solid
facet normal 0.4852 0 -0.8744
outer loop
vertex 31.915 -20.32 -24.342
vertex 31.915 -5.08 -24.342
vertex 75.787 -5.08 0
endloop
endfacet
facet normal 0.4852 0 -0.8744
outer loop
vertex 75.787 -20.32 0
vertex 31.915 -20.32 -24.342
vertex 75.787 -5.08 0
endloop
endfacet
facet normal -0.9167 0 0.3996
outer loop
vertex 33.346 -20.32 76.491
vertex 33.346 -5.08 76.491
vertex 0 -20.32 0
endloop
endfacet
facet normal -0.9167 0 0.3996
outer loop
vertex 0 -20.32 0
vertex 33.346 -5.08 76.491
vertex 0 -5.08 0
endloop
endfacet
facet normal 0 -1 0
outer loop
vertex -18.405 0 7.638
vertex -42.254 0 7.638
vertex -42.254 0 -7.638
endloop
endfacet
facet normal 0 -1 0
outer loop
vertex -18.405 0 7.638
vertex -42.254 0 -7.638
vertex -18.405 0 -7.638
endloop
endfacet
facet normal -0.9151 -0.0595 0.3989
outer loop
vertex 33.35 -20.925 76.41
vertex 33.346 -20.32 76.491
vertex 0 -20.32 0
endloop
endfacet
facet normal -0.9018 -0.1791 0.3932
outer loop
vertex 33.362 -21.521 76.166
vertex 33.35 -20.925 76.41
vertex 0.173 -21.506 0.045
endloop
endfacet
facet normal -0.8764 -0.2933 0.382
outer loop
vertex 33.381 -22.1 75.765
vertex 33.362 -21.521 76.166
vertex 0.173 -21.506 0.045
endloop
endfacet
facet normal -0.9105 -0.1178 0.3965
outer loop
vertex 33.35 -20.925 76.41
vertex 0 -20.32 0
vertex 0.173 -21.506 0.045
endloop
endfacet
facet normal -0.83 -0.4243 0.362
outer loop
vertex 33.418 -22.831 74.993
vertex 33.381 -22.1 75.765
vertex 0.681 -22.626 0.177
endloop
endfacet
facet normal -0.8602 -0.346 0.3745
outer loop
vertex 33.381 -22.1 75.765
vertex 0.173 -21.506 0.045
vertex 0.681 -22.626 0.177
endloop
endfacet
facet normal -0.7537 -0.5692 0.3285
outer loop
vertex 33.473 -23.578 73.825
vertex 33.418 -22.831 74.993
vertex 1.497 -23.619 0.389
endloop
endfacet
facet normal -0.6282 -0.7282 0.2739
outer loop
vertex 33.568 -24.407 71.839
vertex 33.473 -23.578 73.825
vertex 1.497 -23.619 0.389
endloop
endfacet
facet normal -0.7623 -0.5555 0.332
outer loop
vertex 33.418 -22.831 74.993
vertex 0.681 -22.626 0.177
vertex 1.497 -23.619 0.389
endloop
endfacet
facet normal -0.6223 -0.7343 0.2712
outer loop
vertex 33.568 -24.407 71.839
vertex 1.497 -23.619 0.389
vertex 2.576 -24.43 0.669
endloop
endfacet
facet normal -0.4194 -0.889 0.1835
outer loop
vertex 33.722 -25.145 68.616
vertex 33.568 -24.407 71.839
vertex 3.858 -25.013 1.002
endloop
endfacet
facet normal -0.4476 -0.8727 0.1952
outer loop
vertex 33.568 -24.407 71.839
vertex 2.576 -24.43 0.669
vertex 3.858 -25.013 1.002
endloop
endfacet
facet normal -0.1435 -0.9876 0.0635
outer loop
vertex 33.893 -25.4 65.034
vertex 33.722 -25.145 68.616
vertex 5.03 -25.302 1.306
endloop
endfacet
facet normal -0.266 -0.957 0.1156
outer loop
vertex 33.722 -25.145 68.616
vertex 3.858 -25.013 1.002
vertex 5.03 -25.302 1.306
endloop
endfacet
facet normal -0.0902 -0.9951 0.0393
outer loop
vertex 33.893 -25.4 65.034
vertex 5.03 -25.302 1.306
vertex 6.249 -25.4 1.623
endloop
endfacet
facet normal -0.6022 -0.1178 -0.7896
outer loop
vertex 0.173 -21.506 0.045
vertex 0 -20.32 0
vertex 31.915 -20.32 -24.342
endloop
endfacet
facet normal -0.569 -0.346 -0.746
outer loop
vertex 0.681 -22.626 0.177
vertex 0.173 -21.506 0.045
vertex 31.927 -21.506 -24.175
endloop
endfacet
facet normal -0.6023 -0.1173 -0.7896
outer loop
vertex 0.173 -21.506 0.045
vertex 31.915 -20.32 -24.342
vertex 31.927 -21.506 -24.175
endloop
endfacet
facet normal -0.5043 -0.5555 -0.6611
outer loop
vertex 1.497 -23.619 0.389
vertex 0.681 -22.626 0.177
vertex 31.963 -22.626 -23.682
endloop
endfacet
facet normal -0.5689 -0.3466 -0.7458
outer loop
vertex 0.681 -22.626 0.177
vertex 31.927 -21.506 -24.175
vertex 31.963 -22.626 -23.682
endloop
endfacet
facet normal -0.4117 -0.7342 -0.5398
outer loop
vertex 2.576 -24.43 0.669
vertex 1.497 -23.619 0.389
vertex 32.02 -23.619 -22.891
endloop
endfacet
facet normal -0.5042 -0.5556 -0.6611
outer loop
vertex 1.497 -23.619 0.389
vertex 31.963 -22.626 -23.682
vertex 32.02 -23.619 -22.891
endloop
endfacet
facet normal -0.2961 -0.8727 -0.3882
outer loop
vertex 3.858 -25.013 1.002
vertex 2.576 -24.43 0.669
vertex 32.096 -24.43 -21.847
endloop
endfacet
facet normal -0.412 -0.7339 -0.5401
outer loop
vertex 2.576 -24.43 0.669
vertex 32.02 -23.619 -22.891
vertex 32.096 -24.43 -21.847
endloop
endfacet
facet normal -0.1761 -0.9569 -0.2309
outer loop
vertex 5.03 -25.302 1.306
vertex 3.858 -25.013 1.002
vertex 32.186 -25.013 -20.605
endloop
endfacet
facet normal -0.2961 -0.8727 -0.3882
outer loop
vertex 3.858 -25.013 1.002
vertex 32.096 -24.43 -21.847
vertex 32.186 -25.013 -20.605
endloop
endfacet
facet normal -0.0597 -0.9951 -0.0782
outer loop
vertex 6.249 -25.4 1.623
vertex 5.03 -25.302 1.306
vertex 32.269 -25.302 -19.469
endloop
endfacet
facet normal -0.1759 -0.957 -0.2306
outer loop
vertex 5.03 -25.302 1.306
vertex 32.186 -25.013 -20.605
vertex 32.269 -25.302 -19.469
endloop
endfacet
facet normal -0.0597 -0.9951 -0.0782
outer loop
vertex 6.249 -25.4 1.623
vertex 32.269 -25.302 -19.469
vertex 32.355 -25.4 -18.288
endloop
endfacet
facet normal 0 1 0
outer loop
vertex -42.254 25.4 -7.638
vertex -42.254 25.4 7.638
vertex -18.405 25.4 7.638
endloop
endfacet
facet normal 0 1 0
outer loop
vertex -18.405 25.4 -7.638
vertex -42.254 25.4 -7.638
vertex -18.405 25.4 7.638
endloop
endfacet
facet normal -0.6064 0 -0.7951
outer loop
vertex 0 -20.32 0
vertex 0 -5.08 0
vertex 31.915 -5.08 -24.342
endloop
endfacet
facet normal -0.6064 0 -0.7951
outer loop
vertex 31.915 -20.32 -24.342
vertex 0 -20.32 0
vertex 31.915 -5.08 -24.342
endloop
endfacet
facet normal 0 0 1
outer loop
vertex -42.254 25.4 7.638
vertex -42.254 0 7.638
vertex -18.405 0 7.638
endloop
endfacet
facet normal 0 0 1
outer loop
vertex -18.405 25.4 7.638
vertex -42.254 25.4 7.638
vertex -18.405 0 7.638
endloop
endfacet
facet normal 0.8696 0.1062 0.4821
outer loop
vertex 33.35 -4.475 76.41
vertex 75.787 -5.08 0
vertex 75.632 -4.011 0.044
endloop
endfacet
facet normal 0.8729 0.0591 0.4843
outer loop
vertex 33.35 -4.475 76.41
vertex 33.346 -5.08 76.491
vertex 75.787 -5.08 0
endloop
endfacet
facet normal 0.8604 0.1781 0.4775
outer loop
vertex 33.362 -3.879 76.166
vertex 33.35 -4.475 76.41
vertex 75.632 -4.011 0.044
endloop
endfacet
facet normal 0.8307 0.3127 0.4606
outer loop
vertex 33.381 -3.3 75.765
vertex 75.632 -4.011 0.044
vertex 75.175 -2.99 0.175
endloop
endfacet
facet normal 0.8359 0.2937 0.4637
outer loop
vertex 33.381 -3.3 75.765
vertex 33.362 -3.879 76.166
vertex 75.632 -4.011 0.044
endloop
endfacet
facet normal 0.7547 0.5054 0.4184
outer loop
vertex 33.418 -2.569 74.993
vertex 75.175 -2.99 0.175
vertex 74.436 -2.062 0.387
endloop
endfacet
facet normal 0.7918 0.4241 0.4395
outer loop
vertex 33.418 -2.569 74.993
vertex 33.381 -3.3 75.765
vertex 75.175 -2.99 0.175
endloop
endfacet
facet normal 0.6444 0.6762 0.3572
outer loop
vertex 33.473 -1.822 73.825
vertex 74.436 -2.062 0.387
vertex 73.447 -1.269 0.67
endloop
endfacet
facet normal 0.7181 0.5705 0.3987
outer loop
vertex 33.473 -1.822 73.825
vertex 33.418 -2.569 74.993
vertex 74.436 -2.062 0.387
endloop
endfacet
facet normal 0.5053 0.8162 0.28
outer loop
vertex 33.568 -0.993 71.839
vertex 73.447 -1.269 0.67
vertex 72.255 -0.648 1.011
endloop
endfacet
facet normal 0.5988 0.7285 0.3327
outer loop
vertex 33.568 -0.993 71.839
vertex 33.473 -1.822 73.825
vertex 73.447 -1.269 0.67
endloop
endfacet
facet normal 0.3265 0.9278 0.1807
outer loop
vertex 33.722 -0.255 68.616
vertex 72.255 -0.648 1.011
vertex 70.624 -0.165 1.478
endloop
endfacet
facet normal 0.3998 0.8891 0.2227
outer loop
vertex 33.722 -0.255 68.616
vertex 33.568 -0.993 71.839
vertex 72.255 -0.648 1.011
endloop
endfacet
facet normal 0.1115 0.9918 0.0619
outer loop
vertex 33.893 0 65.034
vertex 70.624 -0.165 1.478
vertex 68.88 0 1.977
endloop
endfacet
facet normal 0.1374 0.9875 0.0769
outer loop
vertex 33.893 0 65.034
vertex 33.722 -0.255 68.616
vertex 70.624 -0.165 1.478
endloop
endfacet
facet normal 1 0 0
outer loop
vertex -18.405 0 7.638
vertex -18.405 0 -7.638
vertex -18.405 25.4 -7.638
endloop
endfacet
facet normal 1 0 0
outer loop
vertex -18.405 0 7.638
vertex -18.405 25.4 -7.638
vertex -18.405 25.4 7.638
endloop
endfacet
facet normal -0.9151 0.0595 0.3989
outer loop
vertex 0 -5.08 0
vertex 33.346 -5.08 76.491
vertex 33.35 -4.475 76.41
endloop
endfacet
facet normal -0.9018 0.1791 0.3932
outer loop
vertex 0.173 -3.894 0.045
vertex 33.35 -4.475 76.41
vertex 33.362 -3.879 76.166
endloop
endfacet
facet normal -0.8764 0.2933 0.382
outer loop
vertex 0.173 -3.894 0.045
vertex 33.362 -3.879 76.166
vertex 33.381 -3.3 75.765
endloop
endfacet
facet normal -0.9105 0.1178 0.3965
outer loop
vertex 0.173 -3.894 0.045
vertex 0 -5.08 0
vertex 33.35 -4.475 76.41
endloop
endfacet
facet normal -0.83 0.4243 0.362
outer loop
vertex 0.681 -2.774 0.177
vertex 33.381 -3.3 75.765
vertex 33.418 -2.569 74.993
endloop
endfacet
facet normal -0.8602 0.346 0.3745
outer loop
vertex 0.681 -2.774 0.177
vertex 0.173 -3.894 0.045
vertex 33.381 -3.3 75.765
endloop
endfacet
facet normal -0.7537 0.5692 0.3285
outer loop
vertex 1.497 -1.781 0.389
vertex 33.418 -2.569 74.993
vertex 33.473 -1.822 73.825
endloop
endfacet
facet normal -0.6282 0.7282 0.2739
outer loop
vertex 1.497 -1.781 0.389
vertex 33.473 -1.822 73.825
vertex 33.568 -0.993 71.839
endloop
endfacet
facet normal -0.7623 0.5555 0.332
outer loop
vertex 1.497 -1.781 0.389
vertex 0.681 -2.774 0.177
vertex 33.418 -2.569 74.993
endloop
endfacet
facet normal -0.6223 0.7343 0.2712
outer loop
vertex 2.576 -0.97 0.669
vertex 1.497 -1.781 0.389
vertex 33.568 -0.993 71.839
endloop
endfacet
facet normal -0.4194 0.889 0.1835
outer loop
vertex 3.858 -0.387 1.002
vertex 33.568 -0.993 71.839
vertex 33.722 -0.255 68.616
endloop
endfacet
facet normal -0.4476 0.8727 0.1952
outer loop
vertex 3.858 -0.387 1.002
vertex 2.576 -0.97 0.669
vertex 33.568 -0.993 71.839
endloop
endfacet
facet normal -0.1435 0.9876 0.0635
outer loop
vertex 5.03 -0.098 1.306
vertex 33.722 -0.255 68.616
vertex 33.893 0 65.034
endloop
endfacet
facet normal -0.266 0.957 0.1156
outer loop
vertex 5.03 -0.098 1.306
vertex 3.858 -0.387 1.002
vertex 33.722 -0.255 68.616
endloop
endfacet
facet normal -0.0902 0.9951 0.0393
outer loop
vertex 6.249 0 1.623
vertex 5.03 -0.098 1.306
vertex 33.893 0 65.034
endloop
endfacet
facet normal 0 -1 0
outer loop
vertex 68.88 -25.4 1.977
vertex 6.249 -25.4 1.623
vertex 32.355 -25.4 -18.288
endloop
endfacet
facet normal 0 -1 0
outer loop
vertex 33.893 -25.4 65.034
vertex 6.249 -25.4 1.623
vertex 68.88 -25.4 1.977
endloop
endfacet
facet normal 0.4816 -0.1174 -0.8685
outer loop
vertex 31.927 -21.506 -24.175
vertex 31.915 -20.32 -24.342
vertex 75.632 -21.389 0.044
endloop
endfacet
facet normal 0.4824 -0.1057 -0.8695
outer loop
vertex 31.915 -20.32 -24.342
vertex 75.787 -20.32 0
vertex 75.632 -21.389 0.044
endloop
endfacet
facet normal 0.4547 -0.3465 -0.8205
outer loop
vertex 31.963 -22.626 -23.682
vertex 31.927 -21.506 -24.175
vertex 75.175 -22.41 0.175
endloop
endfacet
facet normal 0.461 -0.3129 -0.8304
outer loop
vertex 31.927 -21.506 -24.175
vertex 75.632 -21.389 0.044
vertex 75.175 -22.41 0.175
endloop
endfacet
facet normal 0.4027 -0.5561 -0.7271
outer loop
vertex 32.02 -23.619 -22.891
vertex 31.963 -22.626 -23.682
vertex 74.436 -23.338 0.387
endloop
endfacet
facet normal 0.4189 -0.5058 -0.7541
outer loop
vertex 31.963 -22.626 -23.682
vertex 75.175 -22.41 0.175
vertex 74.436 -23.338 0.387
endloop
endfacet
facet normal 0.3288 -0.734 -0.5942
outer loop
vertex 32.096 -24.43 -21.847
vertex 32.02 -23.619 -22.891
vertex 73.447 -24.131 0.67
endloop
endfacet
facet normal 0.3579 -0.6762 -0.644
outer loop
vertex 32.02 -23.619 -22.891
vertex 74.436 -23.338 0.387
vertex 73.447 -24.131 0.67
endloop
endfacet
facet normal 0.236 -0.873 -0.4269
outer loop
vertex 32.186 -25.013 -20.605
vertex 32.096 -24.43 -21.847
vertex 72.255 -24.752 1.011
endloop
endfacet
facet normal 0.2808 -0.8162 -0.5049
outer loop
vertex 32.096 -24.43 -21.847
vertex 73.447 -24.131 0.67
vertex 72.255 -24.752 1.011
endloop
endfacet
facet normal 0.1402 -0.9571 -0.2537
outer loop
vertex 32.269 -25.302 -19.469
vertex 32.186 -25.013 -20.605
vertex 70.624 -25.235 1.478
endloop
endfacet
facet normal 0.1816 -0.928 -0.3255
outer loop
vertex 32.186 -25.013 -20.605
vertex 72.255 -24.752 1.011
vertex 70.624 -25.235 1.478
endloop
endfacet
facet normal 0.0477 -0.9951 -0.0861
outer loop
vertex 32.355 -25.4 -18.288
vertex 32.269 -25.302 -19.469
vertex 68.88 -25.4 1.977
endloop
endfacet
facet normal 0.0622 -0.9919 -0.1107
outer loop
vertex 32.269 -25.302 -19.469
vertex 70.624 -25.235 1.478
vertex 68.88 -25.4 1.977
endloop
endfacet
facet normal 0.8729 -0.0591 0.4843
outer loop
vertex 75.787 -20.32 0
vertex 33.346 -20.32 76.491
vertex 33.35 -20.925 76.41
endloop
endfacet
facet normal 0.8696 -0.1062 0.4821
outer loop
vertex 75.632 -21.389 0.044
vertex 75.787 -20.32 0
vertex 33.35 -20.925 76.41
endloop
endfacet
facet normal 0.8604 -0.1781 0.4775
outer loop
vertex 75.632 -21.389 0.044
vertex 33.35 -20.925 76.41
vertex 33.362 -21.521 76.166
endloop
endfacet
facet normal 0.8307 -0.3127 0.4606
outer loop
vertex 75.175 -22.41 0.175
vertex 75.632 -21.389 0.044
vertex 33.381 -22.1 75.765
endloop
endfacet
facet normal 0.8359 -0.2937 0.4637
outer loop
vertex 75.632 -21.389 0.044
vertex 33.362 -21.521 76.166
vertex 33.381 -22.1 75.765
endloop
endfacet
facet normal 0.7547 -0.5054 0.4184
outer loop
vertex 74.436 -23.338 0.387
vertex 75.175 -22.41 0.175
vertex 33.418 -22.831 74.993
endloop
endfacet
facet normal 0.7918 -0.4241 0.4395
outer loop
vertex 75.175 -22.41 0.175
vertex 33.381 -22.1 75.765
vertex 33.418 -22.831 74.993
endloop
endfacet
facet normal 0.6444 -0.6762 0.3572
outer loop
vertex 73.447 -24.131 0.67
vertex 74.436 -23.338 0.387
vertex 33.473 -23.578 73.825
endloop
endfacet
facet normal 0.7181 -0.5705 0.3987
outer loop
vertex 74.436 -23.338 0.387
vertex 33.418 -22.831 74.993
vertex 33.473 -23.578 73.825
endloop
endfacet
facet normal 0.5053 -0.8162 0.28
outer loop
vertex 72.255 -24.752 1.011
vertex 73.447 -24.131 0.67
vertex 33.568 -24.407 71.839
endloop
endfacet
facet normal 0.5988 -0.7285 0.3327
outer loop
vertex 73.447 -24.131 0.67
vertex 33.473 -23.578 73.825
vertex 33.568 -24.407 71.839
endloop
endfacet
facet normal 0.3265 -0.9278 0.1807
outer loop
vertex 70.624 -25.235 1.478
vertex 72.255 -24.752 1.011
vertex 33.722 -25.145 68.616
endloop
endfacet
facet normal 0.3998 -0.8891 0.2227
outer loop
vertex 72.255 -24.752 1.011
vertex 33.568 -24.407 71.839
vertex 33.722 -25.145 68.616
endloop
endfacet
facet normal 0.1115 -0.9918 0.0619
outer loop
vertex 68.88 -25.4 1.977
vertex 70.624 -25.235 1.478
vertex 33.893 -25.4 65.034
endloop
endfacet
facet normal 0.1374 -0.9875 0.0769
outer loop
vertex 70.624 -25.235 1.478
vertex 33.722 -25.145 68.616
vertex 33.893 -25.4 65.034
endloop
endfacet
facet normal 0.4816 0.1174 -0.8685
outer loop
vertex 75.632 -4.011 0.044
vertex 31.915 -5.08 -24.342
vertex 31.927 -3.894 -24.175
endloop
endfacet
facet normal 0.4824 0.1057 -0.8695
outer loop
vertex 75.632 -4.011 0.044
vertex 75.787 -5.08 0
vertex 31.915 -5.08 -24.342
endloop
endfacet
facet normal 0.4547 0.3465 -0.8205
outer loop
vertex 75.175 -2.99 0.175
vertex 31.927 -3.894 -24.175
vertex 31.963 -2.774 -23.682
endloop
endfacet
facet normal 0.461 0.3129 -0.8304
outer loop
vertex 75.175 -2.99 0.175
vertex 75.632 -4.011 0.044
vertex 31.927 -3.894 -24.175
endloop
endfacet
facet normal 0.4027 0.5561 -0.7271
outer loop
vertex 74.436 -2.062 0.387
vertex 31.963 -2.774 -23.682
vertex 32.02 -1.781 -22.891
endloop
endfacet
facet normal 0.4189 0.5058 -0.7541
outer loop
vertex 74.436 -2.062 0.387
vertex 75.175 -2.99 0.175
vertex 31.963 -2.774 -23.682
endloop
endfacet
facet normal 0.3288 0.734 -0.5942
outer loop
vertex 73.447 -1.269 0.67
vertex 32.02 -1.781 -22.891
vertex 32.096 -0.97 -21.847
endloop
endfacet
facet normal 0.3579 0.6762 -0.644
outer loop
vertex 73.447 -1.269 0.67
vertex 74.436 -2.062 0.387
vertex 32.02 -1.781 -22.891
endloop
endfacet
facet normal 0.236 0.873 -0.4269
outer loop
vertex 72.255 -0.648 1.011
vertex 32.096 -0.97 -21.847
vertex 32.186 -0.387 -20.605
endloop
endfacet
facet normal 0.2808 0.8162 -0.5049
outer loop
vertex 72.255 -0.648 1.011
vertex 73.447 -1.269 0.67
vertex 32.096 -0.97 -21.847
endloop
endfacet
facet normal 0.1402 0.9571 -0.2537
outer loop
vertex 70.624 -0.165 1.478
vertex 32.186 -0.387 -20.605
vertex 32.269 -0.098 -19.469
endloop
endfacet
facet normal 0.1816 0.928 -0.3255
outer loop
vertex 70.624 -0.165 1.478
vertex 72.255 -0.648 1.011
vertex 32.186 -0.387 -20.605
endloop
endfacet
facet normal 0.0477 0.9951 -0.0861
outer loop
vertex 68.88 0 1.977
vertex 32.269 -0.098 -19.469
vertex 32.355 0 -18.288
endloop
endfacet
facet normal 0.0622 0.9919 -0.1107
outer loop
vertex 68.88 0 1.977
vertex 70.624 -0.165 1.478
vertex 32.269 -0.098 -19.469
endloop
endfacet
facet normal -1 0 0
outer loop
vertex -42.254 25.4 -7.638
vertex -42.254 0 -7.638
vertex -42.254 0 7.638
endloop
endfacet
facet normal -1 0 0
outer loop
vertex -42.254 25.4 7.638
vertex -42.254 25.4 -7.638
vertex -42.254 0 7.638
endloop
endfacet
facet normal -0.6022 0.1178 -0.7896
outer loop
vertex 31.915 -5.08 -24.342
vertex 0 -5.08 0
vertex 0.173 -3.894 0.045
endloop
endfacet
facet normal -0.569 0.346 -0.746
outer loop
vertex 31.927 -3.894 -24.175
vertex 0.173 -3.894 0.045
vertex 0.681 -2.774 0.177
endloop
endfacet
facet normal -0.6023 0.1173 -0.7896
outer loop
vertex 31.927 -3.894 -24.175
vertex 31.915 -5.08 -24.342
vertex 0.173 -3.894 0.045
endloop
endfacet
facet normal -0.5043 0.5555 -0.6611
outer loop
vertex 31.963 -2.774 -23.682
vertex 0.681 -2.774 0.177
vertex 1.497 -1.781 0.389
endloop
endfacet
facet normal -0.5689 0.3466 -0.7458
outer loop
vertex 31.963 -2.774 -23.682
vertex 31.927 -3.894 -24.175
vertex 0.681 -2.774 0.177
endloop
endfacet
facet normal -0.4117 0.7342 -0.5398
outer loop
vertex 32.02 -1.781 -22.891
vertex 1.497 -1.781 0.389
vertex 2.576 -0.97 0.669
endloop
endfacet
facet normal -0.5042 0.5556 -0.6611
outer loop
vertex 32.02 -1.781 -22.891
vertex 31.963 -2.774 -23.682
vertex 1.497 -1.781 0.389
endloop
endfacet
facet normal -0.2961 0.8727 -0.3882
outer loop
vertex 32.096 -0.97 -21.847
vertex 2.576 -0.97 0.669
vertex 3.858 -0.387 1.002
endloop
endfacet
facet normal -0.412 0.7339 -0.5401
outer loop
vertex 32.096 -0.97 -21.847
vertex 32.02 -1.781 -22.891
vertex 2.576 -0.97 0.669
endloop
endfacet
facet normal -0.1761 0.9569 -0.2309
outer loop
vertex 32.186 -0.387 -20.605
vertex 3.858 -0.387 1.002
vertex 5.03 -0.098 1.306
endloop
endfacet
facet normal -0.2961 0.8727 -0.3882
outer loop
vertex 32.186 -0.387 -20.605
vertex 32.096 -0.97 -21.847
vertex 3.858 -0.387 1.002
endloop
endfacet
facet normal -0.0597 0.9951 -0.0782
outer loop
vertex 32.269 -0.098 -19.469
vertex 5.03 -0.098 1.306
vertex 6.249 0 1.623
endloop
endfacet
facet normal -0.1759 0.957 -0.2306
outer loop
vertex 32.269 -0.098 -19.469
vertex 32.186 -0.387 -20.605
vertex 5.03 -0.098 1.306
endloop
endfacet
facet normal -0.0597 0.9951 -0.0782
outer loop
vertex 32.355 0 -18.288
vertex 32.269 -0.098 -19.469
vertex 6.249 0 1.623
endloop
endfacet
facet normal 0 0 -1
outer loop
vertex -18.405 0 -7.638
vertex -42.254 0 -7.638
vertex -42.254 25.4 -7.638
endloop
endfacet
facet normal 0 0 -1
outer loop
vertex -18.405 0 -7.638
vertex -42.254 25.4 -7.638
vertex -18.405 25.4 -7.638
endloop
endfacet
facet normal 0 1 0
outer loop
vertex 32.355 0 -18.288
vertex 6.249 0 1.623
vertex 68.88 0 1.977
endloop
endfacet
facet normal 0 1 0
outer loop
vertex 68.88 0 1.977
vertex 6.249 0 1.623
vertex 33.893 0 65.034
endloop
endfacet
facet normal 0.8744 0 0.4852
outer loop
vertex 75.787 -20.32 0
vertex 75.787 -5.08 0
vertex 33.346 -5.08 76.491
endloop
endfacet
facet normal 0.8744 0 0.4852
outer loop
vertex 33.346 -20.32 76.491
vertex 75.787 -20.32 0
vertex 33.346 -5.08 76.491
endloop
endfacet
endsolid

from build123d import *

# Parameters (mm, degrees)
F1_DEPTH = 25.4
F2_R     = 5.08
F3_W     = 23.849495
F3_H     = 15.275128
F4_DEPTH = 25.4


with BuildPart() as f1:
    # F0 (on Front) → F1 (new body)
    with BuildSketch(Plane.XZ):
        Polygon((33.346146, 76.491147), (0, 0), (31.915025, -24.341872), (75.786695, 0), align=None)
    extrude(amount=F1_DEPTH)

    # F2
    f2_edges = [f1.edges().sort_by_distance(p)[0] for p in [
        (53.85086, -25.4, -12.170936),
        (54.566421, -25.4, 38.245574),
        (16.673073, -25.4, 38.245574),
        (15.957513, -25.4, -12.170936),
        (53.85086, 0, -12.170936),
        (54.566421, 0, 38.245574),
        (16.673073, 0, 38.245574),
        (15.957513, 0, -12.170936),
    ]]
    fillet(f2_edges, radius=F2_R)


with BuildPart() as f4:
    # F3 (on Front) → F4 (new body)
    with BuildSketch(Plane.XZ):
        with Locations((-30.329249, 0)):
            Rectangle(F3_W, F3_H)
    extrude(amount=-F4_DEPTH)


solid = Compound([f1.part, f4.part])
